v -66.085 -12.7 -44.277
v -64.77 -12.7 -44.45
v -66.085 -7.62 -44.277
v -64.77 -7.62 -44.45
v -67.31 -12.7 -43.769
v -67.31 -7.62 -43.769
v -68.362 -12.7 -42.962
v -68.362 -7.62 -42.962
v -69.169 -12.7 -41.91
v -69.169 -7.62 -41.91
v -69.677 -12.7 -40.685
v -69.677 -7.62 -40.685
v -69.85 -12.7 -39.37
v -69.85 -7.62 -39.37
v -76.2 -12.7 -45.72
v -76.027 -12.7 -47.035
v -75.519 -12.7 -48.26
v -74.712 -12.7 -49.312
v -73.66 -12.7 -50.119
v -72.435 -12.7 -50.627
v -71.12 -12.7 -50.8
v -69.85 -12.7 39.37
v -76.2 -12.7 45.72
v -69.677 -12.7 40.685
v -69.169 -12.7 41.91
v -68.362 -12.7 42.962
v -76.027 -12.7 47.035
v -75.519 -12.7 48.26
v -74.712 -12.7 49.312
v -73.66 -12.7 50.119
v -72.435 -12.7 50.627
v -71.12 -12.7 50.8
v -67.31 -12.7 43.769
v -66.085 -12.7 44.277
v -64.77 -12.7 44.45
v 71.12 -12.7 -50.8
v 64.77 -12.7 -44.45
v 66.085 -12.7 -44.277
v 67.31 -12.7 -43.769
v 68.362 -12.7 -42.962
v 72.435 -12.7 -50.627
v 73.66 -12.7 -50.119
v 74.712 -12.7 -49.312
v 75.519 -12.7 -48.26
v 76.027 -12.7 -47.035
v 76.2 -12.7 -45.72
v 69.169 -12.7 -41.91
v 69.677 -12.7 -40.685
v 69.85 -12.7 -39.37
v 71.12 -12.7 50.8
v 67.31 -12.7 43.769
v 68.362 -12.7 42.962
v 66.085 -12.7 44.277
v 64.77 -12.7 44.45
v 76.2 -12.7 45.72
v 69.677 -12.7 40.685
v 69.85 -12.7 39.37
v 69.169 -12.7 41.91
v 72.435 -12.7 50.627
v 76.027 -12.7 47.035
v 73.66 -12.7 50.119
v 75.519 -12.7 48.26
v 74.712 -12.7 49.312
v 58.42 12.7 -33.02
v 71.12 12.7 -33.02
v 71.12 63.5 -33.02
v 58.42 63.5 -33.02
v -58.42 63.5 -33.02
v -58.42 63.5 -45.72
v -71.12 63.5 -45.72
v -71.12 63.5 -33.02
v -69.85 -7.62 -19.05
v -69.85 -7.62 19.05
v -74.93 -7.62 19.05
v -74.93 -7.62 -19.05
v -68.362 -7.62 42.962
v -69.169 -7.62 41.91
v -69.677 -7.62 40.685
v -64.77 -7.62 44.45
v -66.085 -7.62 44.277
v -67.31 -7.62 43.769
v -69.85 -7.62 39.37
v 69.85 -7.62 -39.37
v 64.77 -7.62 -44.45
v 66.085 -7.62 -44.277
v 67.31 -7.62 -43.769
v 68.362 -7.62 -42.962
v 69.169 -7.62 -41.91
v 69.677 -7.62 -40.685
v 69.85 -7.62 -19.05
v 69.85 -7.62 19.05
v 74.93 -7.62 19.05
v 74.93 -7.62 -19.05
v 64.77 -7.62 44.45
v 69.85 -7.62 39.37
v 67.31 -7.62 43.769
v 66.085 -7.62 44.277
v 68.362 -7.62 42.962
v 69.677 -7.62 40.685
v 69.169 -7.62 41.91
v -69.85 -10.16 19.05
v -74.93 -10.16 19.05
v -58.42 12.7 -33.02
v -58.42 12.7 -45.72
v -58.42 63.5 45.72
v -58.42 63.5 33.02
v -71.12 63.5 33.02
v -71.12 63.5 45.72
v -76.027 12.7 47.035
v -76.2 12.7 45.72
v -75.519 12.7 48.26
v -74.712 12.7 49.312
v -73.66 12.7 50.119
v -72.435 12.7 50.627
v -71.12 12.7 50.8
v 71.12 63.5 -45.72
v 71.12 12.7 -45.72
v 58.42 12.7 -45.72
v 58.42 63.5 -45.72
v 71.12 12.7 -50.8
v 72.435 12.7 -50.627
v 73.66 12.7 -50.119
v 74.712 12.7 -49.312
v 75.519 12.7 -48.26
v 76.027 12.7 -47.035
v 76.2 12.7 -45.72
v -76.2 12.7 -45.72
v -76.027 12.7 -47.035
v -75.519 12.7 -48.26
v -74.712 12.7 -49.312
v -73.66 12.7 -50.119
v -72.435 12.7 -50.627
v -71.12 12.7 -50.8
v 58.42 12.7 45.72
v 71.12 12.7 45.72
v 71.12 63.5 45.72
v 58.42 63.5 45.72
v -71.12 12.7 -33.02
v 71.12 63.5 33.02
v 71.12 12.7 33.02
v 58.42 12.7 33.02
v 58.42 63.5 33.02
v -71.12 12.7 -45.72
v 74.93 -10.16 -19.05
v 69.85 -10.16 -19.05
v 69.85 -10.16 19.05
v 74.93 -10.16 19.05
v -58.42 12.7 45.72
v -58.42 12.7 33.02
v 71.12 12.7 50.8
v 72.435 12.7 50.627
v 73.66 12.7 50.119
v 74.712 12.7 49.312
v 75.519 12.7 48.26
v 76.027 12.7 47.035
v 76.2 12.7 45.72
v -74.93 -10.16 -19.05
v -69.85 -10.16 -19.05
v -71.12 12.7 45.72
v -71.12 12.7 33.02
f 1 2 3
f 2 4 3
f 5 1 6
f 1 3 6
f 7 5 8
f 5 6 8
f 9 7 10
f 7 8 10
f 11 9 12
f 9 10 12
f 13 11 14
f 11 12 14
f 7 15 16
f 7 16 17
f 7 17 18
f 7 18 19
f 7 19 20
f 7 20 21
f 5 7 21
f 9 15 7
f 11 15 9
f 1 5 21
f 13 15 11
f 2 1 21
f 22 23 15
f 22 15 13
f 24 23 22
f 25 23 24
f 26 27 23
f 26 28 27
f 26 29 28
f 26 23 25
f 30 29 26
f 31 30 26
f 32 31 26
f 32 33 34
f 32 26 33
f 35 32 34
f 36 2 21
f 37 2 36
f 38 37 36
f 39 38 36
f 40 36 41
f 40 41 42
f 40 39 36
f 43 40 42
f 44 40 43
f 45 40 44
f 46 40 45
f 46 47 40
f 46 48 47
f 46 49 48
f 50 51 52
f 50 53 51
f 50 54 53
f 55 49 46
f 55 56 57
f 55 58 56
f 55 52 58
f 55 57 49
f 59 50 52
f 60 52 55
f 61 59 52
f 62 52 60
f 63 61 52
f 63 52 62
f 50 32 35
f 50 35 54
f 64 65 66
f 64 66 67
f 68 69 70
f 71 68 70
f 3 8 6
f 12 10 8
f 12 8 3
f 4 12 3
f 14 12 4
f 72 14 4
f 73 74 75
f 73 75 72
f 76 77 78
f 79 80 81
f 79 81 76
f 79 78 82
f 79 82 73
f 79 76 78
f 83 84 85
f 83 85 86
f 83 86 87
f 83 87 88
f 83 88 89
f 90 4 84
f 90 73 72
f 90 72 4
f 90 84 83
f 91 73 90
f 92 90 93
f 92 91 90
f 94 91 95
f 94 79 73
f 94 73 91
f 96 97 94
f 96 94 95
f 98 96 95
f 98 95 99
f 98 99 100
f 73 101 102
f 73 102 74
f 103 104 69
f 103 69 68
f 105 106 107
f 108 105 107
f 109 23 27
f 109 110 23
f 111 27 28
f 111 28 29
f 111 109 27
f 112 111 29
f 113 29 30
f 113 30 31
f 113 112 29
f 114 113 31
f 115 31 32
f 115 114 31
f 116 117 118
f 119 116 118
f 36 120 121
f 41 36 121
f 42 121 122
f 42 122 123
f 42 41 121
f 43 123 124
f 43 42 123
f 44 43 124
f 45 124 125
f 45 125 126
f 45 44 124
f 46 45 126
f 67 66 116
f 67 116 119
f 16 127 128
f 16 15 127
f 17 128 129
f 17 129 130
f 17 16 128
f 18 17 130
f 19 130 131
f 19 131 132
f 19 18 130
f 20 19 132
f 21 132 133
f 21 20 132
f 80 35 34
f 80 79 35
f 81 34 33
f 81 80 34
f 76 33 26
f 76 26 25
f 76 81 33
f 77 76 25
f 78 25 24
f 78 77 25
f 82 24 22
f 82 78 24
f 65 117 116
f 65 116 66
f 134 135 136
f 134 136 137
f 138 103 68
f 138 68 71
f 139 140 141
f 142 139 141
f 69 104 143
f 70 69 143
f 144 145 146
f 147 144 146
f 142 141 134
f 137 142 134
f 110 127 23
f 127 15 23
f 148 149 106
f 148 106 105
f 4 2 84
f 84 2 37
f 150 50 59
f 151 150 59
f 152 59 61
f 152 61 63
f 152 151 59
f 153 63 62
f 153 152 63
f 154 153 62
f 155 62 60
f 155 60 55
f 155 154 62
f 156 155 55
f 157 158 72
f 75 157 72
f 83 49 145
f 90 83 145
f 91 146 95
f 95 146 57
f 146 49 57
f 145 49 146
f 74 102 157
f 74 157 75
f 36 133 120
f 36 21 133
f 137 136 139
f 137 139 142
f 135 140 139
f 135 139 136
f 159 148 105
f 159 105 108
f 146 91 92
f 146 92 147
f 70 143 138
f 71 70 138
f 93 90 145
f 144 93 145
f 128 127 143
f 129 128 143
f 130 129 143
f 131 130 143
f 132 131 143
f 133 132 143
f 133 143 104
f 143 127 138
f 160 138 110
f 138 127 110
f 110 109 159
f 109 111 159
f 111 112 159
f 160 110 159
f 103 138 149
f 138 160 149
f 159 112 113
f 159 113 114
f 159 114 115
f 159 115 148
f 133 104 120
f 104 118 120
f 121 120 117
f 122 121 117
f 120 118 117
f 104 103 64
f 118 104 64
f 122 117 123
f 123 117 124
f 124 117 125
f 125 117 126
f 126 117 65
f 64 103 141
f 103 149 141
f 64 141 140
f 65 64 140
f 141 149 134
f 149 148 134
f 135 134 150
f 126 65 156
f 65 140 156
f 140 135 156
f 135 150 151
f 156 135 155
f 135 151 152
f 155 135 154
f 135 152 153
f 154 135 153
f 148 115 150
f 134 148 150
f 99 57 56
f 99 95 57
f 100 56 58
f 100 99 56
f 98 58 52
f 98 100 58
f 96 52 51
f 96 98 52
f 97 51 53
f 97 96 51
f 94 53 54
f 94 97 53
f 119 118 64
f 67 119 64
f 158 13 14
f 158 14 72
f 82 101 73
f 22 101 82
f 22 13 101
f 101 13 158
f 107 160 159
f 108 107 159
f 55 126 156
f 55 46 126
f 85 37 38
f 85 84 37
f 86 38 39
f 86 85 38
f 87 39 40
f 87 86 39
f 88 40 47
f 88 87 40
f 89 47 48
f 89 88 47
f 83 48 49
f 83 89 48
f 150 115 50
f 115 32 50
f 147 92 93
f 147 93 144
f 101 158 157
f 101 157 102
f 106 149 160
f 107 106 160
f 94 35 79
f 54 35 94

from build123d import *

# Parameters (mm, degrees)
F0_W      = 152.4
F0_H      = 101.6
F1_DEPTH  = 12.7
F2_W      = 139.7
F2_H      = 88.9
F3_DEPTH  = 5.08
F4_R      = 5.08
F5_W      = 2.54
F5_H      = 38.1
F6_DEPTH  = 5.08
F7_W      = 2.54
F7_H      = 38.1
F8_DEPTH  = 5.08
F9_W      = 12.7
F9_H      = 12.7
F10_DEPTH = 50.8


with BuildPart() as f1:
    # F0 (on Front) → F1 (new body, symmetric)
    with BuildSketch(Plane.XZ):
        Rectangle(F0_W, F0_H)
    extrude(amount=F1_DEPTH, both=True)

    # F2 (on face) → F3 (cut)
    with BuildSketch(Plane.XZ.offset(12.7)):
        Rectangle(F2_W, F2_H)
    extrude(amount=-F3_DEPTH, mode=Mode.SUBTRACT)

    # F4
    f4_edges = [f1.edges().sort_by_distance(p)[0] for p in [
        (-69.85, -10.16, -44.45),
        (69.85, -10.16, -44.45),
        (69.85, -10.16, 44.45),
        (-69.85, -10.16, 44.45),
        (-76.2, 0, 50.8),
        (-76.2, 0, -50.8),
        (76.2, 0, 50.8),
        (76.2, 0, -50.8),
    ]]
    fillet(f4_edges, radius=F4_R)

    # F5 (on face) → F6 (cut)
    with BuildSketch(Plane.YZ.offset(-69.85)):
        with Locations((-8.89, 0)):
            Rectangle(F5_W, F5_H)
    extrude(amount=-F6_DEPTH, mode=Mode.SUBTRACT)

    # F7 (on face) → F8 (cut)
    with BuildSketch(Plane(origin=(69.85, 0, 0), x_dir=(0, -1, 0), z_dir=(-1, 0, 0))):
        with Locations((8.89, 0)):
            Rectangle(F7_W, F7_H)
    extrude(amount=-F8_DEPTH, mode=Mode.SUBTRACT)

    # F9 (on face) → F10 (join)
    with BuildSketch(Plane(origin=(0, 12.7, 0), x_dir=(-1, 0, 0), z_dir=(0, 1, 0))):
        with Locations((64.77, 39.37)):
            Rectangle(F9_W, F9_H)
        with Locations((64.77, -39.37)):
            Rectangle(F9_W, F9_H)
        with Locations((-64.77, 39.37)):
            Rectangle(F9_W, F9_H)
        with Locations((-64.77, -39.37)):
            Rectangle(F9_W, F9_H)
    extrude(amount=F10_DEPTH)


solid = f1.part
